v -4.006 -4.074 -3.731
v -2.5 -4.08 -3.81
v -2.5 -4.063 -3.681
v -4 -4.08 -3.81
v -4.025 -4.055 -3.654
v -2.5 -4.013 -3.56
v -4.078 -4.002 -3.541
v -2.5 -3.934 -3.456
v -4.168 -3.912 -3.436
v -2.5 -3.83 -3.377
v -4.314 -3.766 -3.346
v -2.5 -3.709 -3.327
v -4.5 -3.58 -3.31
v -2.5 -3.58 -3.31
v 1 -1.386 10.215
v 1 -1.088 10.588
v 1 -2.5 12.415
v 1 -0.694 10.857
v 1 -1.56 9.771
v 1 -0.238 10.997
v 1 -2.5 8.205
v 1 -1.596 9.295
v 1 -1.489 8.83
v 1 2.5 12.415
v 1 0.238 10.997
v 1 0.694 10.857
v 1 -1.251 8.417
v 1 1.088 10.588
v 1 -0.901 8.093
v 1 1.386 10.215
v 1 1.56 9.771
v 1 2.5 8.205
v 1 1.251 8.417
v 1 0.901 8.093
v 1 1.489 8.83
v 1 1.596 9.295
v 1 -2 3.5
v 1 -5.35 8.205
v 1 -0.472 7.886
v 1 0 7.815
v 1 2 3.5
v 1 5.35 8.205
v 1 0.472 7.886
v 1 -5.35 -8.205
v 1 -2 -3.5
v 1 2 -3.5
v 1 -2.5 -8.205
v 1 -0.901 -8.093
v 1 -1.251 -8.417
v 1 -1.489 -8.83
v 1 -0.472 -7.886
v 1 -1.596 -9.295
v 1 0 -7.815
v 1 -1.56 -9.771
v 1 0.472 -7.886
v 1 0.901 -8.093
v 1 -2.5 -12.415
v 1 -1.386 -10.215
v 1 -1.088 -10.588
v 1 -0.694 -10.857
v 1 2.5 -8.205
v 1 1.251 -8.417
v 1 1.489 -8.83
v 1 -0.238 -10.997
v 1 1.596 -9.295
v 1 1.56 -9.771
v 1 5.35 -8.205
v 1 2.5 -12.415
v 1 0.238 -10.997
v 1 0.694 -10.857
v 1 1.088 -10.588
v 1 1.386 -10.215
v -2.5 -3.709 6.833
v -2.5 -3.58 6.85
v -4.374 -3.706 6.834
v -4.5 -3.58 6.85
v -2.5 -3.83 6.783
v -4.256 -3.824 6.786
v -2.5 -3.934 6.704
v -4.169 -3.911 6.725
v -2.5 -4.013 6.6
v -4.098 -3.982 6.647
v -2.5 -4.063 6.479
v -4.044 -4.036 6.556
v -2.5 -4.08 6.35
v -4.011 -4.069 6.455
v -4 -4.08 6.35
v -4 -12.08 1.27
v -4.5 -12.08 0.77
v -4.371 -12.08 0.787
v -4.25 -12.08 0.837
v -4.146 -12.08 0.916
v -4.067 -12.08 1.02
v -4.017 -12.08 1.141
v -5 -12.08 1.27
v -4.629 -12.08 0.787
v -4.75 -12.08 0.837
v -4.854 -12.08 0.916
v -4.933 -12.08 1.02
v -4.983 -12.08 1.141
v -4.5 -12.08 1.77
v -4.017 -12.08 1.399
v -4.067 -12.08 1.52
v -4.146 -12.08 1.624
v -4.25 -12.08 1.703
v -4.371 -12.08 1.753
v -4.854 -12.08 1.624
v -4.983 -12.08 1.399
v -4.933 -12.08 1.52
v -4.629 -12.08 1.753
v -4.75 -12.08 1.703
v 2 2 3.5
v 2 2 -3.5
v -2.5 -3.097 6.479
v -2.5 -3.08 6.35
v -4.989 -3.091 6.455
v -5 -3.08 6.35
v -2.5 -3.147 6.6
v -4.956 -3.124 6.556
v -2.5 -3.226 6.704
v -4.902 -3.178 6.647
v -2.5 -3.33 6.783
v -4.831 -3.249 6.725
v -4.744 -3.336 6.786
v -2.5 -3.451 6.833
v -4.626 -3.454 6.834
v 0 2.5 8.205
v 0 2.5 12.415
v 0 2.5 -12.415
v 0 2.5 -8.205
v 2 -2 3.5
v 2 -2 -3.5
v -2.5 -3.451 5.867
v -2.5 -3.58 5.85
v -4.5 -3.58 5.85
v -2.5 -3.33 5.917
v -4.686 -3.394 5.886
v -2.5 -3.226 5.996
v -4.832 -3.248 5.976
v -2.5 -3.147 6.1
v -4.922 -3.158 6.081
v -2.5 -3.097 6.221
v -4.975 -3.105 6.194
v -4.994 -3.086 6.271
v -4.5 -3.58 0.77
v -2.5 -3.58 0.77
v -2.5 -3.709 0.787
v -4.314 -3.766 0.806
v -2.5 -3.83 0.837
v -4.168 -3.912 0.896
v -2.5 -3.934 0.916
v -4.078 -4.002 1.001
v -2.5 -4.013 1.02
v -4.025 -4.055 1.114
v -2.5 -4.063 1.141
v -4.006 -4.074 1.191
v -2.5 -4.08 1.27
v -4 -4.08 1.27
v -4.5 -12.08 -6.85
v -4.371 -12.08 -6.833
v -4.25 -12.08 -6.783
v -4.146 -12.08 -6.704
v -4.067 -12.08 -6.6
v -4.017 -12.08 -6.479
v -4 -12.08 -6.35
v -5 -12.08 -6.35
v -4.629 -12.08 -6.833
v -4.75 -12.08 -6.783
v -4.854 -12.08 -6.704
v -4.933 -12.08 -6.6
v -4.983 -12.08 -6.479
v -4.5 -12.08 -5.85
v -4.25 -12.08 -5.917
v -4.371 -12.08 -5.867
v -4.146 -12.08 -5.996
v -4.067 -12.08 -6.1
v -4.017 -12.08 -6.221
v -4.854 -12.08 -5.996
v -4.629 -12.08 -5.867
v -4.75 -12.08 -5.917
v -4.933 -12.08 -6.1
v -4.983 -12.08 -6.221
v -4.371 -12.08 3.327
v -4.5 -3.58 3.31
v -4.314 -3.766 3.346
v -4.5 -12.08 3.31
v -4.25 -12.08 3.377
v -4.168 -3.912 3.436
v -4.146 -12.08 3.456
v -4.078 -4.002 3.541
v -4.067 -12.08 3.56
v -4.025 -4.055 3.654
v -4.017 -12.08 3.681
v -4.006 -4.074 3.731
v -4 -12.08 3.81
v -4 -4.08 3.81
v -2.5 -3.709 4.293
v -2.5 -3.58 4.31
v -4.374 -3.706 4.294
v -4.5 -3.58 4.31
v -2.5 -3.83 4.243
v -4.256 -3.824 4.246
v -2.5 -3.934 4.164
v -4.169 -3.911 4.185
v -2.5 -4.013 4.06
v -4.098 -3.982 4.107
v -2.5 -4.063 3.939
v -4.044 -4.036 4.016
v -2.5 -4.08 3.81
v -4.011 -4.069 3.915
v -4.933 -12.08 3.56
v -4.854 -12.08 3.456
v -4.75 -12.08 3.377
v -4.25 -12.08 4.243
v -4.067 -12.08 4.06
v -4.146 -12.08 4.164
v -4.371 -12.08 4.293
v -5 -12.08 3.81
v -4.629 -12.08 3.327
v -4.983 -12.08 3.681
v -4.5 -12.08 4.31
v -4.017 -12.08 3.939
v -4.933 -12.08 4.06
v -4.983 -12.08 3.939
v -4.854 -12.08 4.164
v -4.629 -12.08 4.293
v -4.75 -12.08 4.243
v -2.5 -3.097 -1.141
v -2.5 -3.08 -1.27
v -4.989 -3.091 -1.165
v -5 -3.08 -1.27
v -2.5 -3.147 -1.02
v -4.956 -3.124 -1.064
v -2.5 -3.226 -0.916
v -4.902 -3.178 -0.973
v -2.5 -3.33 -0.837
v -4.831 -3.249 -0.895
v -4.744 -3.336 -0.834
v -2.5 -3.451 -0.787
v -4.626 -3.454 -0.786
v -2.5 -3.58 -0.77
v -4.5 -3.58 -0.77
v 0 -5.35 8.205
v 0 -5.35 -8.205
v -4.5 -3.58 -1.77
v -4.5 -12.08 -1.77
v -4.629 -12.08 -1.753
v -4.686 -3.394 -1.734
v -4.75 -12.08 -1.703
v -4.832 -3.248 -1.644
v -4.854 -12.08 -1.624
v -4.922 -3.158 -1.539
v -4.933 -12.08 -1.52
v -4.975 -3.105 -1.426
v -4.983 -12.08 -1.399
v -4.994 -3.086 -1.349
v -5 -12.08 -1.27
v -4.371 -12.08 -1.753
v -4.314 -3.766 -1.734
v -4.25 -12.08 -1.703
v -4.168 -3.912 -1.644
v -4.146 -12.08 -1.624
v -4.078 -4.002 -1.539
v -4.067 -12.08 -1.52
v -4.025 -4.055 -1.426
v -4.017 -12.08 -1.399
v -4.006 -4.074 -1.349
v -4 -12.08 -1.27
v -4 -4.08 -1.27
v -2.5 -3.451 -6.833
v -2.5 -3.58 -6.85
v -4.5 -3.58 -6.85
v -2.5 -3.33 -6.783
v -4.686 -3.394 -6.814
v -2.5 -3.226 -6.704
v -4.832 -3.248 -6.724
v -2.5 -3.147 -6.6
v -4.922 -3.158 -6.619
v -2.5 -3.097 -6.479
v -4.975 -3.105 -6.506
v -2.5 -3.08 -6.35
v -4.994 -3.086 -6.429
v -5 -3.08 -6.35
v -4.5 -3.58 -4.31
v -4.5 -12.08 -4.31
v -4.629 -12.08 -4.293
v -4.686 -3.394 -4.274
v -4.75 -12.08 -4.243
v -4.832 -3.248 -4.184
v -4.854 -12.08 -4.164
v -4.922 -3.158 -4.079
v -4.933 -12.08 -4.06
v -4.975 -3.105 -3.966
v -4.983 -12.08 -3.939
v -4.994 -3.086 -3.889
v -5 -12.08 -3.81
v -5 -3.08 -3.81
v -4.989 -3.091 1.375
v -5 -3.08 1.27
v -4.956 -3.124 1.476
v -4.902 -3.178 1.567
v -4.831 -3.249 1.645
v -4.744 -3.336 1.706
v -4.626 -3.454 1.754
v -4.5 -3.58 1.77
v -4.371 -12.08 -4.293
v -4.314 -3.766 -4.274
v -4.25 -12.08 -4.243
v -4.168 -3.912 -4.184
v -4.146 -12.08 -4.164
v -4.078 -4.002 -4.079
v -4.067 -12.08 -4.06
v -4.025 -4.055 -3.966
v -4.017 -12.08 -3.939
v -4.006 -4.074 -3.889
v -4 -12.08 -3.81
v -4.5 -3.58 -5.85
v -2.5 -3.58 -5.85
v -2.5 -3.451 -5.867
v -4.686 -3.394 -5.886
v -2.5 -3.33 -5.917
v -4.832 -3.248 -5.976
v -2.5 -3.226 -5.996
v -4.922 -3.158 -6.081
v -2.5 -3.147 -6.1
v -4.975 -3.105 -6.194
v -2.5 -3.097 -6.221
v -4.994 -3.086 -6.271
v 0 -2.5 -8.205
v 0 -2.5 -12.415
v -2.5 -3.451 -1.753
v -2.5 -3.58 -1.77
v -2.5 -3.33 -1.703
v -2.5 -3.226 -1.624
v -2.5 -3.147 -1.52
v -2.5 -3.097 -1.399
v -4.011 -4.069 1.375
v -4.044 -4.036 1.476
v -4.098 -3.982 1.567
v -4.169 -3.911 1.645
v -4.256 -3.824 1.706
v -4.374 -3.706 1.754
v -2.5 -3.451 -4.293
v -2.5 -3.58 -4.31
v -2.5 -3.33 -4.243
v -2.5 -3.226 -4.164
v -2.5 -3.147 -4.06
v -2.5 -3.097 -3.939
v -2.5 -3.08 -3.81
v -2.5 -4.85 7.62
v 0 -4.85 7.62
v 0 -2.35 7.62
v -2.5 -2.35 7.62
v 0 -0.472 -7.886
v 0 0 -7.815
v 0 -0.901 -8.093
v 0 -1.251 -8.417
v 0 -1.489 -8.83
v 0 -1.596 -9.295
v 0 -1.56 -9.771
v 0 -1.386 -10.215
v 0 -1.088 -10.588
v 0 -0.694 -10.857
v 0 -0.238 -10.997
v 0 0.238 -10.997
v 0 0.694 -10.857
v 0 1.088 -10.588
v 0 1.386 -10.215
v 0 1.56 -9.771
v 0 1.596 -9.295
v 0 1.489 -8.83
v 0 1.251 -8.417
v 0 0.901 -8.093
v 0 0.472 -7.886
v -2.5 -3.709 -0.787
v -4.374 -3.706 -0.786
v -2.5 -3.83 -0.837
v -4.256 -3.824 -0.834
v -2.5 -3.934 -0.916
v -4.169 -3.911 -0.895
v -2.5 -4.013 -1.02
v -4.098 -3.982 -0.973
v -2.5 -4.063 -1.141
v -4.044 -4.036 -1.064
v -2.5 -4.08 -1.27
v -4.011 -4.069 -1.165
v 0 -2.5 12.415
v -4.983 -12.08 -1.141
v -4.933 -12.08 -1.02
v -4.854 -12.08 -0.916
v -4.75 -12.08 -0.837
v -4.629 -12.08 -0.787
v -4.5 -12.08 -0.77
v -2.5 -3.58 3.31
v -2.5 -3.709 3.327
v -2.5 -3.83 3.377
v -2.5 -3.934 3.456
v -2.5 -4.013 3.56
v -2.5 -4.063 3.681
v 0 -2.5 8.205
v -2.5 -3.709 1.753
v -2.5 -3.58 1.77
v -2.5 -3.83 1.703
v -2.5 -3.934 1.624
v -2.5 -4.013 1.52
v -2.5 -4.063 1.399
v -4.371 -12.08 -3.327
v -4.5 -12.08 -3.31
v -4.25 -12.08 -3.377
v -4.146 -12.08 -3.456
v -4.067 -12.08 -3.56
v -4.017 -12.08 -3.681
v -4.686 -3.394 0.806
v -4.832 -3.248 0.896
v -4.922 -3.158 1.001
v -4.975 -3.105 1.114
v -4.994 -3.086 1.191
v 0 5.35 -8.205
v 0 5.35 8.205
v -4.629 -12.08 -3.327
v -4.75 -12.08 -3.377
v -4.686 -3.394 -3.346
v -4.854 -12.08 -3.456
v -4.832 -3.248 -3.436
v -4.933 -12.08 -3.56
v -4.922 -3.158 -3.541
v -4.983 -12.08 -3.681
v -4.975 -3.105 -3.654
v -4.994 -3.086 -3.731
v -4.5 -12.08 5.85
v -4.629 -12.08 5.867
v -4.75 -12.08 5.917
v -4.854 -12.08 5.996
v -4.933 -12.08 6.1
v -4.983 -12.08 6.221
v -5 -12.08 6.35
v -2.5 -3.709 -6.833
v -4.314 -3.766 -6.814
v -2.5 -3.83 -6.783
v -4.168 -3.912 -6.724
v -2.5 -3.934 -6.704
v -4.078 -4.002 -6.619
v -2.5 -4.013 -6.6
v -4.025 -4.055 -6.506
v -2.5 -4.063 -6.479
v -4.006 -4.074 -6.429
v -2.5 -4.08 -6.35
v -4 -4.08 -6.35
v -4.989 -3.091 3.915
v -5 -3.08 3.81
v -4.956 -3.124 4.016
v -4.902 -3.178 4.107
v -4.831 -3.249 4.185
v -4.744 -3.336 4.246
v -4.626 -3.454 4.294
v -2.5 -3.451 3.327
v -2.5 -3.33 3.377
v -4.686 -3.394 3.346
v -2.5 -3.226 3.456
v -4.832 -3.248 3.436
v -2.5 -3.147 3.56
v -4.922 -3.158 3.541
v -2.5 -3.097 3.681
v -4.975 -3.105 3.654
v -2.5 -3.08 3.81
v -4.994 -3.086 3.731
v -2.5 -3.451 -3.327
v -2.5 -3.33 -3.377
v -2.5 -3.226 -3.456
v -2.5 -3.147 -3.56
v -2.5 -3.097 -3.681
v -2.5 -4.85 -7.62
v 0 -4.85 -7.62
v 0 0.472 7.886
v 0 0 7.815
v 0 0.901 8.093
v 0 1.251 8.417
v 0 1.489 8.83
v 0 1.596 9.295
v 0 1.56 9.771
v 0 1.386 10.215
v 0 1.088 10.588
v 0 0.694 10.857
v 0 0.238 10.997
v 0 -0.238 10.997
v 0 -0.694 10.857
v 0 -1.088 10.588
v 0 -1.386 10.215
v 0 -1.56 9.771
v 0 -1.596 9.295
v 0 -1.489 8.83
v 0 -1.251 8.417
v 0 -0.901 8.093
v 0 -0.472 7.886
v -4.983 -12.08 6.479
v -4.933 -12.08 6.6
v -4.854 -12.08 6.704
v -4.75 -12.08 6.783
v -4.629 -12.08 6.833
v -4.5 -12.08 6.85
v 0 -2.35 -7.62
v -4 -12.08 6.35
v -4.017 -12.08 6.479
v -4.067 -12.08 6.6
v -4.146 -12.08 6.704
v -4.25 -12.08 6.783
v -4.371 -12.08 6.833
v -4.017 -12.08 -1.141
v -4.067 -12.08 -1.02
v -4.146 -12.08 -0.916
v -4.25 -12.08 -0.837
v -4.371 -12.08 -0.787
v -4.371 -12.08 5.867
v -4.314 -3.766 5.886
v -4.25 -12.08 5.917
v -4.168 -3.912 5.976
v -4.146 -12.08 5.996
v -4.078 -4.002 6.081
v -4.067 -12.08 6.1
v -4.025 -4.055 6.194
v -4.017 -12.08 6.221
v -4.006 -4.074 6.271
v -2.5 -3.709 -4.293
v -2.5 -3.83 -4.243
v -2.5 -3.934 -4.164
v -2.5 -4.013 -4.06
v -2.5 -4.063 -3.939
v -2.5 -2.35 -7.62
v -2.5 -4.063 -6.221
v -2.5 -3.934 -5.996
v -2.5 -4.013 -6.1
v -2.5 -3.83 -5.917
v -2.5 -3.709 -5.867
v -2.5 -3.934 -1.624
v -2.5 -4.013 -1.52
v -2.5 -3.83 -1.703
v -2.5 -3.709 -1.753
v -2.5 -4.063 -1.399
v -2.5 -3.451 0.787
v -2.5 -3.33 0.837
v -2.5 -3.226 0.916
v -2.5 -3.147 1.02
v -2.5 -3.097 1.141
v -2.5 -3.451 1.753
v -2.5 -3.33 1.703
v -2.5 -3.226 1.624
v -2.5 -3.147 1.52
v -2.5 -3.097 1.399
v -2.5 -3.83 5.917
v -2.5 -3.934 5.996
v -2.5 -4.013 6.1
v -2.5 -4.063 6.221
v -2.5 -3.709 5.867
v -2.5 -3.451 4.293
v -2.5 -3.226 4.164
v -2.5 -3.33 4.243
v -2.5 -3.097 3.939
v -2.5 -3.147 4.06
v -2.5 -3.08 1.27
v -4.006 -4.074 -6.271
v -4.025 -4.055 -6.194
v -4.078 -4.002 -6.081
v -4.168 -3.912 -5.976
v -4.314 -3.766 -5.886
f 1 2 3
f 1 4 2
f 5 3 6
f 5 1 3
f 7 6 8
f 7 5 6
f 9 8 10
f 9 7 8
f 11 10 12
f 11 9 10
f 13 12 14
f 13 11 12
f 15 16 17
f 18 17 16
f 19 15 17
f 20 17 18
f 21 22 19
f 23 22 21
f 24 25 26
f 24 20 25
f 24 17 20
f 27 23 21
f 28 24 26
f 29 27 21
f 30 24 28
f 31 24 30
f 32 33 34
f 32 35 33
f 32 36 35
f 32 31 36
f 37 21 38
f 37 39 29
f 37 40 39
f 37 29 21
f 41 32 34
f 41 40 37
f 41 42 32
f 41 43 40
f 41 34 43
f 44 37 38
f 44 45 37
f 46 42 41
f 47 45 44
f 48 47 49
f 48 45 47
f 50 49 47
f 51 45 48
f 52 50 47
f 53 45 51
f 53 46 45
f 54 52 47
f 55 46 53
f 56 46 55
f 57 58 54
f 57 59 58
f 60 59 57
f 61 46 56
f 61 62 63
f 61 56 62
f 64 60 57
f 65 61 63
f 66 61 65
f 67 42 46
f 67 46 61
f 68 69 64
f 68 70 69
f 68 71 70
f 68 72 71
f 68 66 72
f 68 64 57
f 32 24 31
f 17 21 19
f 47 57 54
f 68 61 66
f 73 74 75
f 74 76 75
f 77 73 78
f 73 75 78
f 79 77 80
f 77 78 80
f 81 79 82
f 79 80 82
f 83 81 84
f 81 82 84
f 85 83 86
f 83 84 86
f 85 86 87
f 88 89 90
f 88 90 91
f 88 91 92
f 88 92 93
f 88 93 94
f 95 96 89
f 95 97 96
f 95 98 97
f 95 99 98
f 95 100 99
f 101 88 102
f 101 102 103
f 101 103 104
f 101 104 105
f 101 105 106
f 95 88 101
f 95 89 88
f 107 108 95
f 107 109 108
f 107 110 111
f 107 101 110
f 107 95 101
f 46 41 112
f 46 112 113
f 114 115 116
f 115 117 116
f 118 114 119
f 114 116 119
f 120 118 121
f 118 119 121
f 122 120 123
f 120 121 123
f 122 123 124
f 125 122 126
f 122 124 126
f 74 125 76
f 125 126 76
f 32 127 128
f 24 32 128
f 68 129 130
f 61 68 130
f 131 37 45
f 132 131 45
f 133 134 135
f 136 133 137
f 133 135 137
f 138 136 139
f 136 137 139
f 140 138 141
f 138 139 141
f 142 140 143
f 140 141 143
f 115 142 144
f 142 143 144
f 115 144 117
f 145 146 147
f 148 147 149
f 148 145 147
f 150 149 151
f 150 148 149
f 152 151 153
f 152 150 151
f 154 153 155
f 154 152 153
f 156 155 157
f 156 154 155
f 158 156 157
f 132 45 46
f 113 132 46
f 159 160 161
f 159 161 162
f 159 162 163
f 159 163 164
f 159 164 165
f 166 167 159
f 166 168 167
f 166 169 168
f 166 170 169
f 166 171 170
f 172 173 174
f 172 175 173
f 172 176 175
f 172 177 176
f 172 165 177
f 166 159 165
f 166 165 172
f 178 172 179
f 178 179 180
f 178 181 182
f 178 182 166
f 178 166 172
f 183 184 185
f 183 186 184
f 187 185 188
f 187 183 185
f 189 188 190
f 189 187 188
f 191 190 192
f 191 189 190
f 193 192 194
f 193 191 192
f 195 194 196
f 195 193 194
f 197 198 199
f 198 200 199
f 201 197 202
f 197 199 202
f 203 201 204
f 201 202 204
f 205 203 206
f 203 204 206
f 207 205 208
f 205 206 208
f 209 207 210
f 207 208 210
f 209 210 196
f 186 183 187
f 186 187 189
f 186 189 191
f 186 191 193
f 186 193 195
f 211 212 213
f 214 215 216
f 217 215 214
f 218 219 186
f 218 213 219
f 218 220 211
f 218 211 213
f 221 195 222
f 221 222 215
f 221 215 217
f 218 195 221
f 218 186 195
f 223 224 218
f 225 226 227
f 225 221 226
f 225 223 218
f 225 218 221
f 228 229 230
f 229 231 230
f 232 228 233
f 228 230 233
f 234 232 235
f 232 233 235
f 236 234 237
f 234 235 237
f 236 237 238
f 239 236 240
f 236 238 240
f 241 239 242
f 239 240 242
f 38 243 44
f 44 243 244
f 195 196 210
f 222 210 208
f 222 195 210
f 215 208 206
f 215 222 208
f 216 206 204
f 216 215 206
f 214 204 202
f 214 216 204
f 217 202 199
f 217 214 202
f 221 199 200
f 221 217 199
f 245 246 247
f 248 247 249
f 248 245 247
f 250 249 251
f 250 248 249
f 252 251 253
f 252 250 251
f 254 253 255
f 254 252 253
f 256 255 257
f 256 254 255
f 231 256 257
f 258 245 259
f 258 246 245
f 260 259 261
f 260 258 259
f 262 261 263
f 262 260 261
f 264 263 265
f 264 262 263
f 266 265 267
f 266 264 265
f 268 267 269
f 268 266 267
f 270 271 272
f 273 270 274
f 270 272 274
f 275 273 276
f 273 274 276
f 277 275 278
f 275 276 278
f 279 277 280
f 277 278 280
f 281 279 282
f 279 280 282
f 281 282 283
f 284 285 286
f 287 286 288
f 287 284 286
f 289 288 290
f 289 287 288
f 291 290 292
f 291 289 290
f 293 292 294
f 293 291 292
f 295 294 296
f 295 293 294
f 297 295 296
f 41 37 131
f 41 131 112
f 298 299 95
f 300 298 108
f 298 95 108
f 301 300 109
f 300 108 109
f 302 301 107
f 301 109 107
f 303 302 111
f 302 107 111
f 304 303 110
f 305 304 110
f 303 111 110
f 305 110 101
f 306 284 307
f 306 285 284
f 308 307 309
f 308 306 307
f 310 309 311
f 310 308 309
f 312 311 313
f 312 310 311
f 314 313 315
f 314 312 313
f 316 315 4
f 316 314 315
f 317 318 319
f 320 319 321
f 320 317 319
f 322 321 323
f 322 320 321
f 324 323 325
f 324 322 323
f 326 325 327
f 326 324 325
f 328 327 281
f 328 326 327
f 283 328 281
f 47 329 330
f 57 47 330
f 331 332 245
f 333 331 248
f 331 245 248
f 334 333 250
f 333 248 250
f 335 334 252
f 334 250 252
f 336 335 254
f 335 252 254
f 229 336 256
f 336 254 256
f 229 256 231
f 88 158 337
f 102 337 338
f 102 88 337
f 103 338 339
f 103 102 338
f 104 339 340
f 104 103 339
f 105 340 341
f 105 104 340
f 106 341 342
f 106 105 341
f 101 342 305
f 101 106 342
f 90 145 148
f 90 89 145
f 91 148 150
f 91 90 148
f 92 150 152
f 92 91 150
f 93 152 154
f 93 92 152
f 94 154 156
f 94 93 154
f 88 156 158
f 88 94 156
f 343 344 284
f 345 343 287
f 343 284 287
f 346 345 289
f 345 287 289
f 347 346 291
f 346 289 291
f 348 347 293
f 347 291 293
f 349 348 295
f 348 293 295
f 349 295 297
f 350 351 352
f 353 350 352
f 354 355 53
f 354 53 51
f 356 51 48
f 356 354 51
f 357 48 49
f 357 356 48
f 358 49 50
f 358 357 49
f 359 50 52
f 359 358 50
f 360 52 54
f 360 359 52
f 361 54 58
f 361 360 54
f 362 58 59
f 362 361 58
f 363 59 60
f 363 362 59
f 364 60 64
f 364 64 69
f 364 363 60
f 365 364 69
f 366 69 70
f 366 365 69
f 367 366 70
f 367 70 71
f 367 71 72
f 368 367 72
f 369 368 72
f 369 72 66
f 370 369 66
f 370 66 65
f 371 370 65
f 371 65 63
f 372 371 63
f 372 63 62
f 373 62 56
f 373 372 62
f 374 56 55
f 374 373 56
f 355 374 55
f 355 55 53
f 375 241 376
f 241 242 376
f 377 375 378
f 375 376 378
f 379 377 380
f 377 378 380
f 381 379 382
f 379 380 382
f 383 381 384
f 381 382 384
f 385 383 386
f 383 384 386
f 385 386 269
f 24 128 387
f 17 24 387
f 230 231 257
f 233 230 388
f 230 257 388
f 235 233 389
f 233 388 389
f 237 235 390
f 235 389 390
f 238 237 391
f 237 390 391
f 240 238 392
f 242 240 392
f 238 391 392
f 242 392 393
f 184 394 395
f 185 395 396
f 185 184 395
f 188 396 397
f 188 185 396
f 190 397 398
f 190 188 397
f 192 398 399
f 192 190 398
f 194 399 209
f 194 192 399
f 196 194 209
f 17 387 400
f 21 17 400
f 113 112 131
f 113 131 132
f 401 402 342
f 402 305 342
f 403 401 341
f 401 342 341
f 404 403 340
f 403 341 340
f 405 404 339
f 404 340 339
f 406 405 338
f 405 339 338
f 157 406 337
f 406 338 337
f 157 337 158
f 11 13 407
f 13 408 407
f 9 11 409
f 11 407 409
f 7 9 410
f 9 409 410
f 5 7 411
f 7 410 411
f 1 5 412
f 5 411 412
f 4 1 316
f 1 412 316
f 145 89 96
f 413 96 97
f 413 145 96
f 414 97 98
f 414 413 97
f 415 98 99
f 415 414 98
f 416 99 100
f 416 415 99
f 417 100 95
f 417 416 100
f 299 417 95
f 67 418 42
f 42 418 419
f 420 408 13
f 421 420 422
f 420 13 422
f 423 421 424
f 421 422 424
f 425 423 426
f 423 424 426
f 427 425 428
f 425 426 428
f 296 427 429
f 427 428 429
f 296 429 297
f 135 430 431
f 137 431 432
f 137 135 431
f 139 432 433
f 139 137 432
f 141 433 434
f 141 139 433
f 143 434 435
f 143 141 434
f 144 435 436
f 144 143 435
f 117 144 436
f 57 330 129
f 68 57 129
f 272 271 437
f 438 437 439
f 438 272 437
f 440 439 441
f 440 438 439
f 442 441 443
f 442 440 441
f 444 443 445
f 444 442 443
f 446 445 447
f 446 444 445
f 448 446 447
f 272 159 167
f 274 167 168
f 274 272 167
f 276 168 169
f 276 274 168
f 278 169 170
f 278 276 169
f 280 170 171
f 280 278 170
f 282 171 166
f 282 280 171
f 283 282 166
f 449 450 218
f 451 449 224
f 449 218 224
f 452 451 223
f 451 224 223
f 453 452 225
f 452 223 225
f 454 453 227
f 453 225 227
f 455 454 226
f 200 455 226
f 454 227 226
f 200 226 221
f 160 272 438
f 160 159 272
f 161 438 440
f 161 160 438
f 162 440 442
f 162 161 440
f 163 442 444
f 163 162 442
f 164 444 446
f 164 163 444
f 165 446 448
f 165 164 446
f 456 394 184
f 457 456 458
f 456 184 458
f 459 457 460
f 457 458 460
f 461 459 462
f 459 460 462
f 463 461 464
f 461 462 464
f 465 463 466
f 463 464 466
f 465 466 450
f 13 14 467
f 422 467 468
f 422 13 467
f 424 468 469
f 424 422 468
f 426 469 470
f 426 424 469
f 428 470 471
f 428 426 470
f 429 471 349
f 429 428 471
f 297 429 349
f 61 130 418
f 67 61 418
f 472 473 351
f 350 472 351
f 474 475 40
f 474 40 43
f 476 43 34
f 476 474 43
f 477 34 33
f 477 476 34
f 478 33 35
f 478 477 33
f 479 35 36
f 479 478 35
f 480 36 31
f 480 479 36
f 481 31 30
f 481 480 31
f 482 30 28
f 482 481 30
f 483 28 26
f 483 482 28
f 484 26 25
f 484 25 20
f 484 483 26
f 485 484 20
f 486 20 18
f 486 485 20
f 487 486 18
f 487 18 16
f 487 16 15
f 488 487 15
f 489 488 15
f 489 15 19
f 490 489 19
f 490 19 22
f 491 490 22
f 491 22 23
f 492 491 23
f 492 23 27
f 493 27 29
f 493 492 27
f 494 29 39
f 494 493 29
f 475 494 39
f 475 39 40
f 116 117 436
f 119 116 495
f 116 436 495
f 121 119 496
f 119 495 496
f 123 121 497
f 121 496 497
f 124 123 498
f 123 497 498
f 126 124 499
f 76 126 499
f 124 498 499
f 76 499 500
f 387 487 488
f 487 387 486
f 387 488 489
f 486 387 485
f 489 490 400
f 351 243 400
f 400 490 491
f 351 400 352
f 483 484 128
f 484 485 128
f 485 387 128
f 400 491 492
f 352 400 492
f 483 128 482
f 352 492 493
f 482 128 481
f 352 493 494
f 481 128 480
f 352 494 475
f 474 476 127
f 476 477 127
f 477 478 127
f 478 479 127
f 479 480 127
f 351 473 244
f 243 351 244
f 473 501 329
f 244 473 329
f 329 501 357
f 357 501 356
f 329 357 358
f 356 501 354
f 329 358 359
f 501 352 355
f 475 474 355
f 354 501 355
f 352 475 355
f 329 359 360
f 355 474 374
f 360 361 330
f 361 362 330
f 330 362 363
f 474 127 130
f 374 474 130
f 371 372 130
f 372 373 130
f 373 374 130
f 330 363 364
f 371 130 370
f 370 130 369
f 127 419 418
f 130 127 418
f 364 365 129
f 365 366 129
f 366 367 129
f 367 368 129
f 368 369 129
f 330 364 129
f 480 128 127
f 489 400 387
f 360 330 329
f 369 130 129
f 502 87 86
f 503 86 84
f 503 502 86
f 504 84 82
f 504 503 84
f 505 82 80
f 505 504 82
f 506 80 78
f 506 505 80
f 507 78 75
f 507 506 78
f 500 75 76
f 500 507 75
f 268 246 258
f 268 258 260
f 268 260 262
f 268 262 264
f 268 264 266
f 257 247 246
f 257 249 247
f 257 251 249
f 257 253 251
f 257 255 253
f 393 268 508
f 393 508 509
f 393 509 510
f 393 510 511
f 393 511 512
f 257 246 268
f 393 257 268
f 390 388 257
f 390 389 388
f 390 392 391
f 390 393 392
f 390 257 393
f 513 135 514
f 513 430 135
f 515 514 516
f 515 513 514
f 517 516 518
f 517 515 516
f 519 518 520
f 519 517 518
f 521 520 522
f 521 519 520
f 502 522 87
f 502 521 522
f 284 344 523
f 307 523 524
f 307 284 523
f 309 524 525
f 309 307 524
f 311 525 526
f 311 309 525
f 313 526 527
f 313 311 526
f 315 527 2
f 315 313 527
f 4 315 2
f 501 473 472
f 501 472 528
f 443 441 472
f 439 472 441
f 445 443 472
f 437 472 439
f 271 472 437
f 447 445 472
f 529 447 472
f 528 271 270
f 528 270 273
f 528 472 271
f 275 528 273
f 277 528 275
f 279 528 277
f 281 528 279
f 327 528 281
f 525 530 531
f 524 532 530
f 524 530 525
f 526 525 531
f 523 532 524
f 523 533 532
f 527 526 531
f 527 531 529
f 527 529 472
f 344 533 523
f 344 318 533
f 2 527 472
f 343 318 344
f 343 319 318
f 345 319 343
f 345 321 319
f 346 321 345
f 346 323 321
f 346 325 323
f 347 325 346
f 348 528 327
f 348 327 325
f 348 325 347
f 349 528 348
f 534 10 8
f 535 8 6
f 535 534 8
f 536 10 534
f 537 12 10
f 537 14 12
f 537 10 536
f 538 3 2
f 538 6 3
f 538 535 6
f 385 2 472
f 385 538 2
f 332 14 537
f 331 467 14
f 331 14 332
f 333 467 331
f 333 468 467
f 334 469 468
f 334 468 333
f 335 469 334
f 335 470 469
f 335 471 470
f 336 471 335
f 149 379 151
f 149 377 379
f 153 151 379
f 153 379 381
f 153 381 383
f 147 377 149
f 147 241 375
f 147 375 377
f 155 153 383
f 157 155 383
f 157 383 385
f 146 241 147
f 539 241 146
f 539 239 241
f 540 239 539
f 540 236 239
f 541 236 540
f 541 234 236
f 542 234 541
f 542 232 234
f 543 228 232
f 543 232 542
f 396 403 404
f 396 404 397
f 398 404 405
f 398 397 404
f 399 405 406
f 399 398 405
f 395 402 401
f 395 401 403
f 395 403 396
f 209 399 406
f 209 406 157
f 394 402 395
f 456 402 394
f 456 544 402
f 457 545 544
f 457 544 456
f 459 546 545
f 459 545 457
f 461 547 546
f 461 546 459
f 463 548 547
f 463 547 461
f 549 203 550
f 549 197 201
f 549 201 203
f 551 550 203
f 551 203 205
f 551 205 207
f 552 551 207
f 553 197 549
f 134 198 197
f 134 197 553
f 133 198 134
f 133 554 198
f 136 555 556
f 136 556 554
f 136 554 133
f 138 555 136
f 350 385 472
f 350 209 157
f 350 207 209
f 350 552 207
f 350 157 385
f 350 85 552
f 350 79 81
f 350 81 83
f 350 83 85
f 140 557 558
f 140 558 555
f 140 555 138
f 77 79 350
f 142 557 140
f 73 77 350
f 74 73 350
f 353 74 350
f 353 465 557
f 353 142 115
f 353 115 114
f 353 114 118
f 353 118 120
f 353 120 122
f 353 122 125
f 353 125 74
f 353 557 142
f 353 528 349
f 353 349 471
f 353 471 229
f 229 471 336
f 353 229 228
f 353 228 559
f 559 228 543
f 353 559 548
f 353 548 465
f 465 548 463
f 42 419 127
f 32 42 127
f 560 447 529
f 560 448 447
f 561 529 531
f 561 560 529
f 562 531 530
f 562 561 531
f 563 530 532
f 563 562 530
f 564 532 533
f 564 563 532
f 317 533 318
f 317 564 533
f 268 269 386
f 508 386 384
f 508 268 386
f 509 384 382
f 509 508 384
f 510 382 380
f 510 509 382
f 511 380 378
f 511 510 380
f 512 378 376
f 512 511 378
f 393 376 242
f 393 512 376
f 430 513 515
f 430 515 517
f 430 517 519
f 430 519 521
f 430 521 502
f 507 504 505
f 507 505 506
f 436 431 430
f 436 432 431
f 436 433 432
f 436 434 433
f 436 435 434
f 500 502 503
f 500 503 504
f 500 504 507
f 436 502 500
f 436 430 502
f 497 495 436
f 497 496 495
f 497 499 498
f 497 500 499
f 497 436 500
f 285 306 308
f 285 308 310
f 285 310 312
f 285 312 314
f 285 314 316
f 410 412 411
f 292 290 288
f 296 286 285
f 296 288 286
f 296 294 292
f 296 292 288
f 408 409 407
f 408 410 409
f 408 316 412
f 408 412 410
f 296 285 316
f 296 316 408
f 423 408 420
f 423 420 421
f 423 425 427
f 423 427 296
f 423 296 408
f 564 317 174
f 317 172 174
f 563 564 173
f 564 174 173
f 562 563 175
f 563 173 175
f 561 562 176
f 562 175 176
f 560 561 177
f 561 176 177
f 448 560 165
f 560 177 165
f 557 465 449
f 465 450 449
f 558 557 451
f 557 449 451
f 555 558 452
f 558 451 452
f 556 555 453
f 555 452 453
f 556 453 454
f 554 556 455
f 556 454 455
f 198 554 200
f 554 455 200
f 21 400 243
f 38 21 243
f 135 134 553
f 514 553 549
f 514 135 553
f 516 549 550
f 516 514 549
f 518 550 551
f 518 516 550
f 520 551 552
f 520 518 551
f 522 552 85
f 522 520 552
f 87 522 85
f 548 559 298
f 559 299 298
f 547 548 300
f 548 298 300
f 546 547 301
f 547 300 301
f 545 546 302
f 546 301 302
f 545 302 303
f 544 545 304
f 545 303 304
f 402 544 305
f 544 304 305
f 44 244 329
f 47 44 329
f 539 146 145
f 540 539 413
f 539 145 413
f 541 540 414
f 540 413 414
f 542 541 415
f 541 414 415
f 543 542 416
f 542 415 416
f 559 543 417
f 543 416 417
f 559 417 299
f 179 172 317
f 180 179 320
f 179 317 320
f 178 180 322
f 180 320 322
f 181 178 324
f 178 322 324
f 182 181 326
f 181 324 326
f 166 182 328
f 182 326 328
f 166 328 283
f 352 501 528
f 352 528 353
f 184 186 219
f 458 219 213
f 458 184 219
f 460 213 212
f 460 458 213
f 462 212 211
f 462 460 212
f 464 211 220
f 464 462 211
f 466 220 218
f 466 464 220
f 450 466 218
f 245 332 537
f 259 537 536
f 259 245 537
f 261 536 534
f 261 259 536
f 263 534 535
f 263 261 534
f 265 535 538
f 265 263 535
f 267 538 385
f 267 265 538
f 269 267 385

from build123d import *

# Parameters (mm, degrees)
SKETCH1_R              = 1.6
BOSS_EXTRUDE1_DEPTH    = 1
SKETCH2_W              = 7
SKETCH2_H              = 4
BOSS_EXTRUDE2_DEPTH    = 1
SKETCH4_W              = 15.24
SKETCH4_H              = 2.5
BOSS_EXTRUDE3_DEPTH    = 2.5
SKETCH6_W              = 1
SKETCH6_H              = 1
BOSS_EXTRUDE4_DEPTH    = 2.5
SKETCH8_W              = 1
SKETCH8_H              = 1
BOSS_EXTRUDE5_DEPTH    = 8
FILLET1_R              = 0.5
LPATTERN1_COUNT        = 6
LPATTERN1_PITCH        = 2.54
FILLET1_OF_LPATTERN1_R = 0.5


with BuildPart() as part:
    # Sketch1 → Boss-Extrude1 (new body)
    with BuildSketch(Plane(origin=(0, 0, 0), x_dir=(0, 0, -1), z_dir=(1, 0, 0))):
        Polygon((-8.205, 2.5), (-12.415, 2.5), (-12.415, -2.5), (-8.205, -2.5), (-8.205, -5.35), (8.205, -5.35), (8.205, -2.5), (12.415, -2.5), (12.415, 2.5), (8.205, 2.5), (8.205, 5.35), (-8.205, 5.35), align=None)
        with Locations((-9.415, 0)):
            Circle(SKETCH1_R, mode=Mode.SUBTRACT)
        with Locations(Location((9.415, 0, 0), (0, 0, 180))):
            Circle(SKETCH1_R, mode=Mode.SUBTRACT)
    extrude(amount=BOSS_EXTRUDE1_DEPTH)

    # Sketch2 → Boss-Extrude2 (add)
    with BuildSketch(Plane(origin=(1, 0, 0), x_dir=(0, 0, -1), z_dir=(1, 0, 0))):
        Rectangle(SKETCH2_W, SKETCH2_H)
    extrude(amount=BOSS_EXTRUDE2_DEPTH)

    # Sketch4 → Boss-Extrude3 (add)
    with BuildSketch(Plane(origin=(0, 6.053191046, 0.231711856), x_dir=(0, 0, 1), z_dir=(-1, 0, 0))):
        with Locations((-0.231711856, -9.653191046)):
            Rectangle(SKETCH4_W, SKETCH4_H)
    extrude(amount=BOSS_EXTRUDE3_DEPTH)

    # Sketch6 → Boss-Extrude4 (add)
    with BuildSketch(Plane(origin=(-2.5, 6.053191046, 0.231711856), x_dir=(0, 0, 1), z_dir=(-1, 0, 0))):
        with Locations((-6.581711856, -9.633191046)):
            Rectangle(SKETCH6_W, SKETCH6_H)
    boss_extrude4 = extrude(amount=BOSS_EXTRUDE4_DEPTH)

    # Sketch8 → Boss-Extrude5 (add)
    with BuildSketch(Plane(origin=(1, -4.08, 0.231711856), x_dir=(0, 0, 1), z_dir=(0, -1, 0))):
        with Locations((-6.581711856, 5.5)):
            Rectangle(SKETCH8_W, SKETCH8_H)
    boss_extrude5 = extrude(amount=BOSS_EXTRUDE5_DEPTH)

    # Fillet1
    fillet1_edges = [part.edges().sort_by_distance(p)[0] for p in [
        (-4, -8.08, -5.85),
        (-4, -8.08, -6.85),
        (-3.25, -4.08, -5.85),
        (-3.25, -4.08, -6.85),
        (-3.75, -3.08, -5.85),
        (-3.75, -3.08, -6.85),
        (-5, -7.58, -5.85),
        (-5, -7.58, -6.85),
    ]]
    fillet(fillet1_edges, radius=FILLET1_R - 0.0001)  # a hair under: the kernel refuses the full size

    # LPattern1: Boss-Extrude4, Boss-Extrude5 ×6
    with Locations(*[(0, 0, i * LPATTERN1_PITCH) for i in range(1, LPATTERN1_COUNT)]):
        add(boss_extrude4)
        add(boss_extrude5)

    # Fillet1 of LPattern1
    fillet1_of_lpattern1_edges = [part.edges().sort_by_distance(p)[0] for p in [
        (-4, -8.08, -3.31),
        (-4, -8.08, -4.31),
        (-3.25, -4.08, -3.31),
        (-3.25, -4.08, -4.31),
        (-3.75, -3.08, -3.31),
        (-3.75, -3.08, -4.31),
        (-5, -7.58, -3.31),
        (-5, -7.58, -4.31),
        (-4, -8.08, -0.77),
        (-4, -8.08, -1.77),
        (-3.25, -4.08, -0.77),
        (-3.25, -4.08, -1.77),
        (-3.75, -3.08, -0.77),
        (-3.75, -3.08, -1.77),
        (-5, -7.58, -0.77),
        (-5, -7.58, -1.77),
        (-4, -8.08, 1.77),
        (-4, -8.08, 0.77),
        (-3.25, -4.08, 1.77),
        (-3.25, -4.08, 0.77),
        (-3.75, -3.08, 1.77),
        (-3.75, -3.08, 0.77),
        (-5, -7.58, 1.77),
        (-5, -7.58, 0.77),
        (-4, -8.08, 4.31),
        (-4, -8.08, 3.31),
        (-3.25, -4.08, 4.31),
        (-3.25, -4.08, 3.31),
        (-3.75, -3.08, 4.31),
        (-3.75, -3.08, 3.31),
        (-5, -7.58, 4.31),
        (-5, -7.58, 3.31),
        (-4, -8.08, 6.85),
        (-4, -8.08, 5.85),
        (-3.25, -4.08, 6.85),
        (-3.25, -4.08, 5.85),
        (-3.75, -3.08, 6.85),
        (-3.75, -3.08, 5.85),
        (-5, -7.58, 6.85),
        (-5, -7.58, 5.85),
    ]]
    fillet(fillet1_of_lpattern1_edges, radius=FILLET1_OF_LPATTERN1_R - 0.0001)  # a hair under: the kernel refuses the full size


solid = part.part
